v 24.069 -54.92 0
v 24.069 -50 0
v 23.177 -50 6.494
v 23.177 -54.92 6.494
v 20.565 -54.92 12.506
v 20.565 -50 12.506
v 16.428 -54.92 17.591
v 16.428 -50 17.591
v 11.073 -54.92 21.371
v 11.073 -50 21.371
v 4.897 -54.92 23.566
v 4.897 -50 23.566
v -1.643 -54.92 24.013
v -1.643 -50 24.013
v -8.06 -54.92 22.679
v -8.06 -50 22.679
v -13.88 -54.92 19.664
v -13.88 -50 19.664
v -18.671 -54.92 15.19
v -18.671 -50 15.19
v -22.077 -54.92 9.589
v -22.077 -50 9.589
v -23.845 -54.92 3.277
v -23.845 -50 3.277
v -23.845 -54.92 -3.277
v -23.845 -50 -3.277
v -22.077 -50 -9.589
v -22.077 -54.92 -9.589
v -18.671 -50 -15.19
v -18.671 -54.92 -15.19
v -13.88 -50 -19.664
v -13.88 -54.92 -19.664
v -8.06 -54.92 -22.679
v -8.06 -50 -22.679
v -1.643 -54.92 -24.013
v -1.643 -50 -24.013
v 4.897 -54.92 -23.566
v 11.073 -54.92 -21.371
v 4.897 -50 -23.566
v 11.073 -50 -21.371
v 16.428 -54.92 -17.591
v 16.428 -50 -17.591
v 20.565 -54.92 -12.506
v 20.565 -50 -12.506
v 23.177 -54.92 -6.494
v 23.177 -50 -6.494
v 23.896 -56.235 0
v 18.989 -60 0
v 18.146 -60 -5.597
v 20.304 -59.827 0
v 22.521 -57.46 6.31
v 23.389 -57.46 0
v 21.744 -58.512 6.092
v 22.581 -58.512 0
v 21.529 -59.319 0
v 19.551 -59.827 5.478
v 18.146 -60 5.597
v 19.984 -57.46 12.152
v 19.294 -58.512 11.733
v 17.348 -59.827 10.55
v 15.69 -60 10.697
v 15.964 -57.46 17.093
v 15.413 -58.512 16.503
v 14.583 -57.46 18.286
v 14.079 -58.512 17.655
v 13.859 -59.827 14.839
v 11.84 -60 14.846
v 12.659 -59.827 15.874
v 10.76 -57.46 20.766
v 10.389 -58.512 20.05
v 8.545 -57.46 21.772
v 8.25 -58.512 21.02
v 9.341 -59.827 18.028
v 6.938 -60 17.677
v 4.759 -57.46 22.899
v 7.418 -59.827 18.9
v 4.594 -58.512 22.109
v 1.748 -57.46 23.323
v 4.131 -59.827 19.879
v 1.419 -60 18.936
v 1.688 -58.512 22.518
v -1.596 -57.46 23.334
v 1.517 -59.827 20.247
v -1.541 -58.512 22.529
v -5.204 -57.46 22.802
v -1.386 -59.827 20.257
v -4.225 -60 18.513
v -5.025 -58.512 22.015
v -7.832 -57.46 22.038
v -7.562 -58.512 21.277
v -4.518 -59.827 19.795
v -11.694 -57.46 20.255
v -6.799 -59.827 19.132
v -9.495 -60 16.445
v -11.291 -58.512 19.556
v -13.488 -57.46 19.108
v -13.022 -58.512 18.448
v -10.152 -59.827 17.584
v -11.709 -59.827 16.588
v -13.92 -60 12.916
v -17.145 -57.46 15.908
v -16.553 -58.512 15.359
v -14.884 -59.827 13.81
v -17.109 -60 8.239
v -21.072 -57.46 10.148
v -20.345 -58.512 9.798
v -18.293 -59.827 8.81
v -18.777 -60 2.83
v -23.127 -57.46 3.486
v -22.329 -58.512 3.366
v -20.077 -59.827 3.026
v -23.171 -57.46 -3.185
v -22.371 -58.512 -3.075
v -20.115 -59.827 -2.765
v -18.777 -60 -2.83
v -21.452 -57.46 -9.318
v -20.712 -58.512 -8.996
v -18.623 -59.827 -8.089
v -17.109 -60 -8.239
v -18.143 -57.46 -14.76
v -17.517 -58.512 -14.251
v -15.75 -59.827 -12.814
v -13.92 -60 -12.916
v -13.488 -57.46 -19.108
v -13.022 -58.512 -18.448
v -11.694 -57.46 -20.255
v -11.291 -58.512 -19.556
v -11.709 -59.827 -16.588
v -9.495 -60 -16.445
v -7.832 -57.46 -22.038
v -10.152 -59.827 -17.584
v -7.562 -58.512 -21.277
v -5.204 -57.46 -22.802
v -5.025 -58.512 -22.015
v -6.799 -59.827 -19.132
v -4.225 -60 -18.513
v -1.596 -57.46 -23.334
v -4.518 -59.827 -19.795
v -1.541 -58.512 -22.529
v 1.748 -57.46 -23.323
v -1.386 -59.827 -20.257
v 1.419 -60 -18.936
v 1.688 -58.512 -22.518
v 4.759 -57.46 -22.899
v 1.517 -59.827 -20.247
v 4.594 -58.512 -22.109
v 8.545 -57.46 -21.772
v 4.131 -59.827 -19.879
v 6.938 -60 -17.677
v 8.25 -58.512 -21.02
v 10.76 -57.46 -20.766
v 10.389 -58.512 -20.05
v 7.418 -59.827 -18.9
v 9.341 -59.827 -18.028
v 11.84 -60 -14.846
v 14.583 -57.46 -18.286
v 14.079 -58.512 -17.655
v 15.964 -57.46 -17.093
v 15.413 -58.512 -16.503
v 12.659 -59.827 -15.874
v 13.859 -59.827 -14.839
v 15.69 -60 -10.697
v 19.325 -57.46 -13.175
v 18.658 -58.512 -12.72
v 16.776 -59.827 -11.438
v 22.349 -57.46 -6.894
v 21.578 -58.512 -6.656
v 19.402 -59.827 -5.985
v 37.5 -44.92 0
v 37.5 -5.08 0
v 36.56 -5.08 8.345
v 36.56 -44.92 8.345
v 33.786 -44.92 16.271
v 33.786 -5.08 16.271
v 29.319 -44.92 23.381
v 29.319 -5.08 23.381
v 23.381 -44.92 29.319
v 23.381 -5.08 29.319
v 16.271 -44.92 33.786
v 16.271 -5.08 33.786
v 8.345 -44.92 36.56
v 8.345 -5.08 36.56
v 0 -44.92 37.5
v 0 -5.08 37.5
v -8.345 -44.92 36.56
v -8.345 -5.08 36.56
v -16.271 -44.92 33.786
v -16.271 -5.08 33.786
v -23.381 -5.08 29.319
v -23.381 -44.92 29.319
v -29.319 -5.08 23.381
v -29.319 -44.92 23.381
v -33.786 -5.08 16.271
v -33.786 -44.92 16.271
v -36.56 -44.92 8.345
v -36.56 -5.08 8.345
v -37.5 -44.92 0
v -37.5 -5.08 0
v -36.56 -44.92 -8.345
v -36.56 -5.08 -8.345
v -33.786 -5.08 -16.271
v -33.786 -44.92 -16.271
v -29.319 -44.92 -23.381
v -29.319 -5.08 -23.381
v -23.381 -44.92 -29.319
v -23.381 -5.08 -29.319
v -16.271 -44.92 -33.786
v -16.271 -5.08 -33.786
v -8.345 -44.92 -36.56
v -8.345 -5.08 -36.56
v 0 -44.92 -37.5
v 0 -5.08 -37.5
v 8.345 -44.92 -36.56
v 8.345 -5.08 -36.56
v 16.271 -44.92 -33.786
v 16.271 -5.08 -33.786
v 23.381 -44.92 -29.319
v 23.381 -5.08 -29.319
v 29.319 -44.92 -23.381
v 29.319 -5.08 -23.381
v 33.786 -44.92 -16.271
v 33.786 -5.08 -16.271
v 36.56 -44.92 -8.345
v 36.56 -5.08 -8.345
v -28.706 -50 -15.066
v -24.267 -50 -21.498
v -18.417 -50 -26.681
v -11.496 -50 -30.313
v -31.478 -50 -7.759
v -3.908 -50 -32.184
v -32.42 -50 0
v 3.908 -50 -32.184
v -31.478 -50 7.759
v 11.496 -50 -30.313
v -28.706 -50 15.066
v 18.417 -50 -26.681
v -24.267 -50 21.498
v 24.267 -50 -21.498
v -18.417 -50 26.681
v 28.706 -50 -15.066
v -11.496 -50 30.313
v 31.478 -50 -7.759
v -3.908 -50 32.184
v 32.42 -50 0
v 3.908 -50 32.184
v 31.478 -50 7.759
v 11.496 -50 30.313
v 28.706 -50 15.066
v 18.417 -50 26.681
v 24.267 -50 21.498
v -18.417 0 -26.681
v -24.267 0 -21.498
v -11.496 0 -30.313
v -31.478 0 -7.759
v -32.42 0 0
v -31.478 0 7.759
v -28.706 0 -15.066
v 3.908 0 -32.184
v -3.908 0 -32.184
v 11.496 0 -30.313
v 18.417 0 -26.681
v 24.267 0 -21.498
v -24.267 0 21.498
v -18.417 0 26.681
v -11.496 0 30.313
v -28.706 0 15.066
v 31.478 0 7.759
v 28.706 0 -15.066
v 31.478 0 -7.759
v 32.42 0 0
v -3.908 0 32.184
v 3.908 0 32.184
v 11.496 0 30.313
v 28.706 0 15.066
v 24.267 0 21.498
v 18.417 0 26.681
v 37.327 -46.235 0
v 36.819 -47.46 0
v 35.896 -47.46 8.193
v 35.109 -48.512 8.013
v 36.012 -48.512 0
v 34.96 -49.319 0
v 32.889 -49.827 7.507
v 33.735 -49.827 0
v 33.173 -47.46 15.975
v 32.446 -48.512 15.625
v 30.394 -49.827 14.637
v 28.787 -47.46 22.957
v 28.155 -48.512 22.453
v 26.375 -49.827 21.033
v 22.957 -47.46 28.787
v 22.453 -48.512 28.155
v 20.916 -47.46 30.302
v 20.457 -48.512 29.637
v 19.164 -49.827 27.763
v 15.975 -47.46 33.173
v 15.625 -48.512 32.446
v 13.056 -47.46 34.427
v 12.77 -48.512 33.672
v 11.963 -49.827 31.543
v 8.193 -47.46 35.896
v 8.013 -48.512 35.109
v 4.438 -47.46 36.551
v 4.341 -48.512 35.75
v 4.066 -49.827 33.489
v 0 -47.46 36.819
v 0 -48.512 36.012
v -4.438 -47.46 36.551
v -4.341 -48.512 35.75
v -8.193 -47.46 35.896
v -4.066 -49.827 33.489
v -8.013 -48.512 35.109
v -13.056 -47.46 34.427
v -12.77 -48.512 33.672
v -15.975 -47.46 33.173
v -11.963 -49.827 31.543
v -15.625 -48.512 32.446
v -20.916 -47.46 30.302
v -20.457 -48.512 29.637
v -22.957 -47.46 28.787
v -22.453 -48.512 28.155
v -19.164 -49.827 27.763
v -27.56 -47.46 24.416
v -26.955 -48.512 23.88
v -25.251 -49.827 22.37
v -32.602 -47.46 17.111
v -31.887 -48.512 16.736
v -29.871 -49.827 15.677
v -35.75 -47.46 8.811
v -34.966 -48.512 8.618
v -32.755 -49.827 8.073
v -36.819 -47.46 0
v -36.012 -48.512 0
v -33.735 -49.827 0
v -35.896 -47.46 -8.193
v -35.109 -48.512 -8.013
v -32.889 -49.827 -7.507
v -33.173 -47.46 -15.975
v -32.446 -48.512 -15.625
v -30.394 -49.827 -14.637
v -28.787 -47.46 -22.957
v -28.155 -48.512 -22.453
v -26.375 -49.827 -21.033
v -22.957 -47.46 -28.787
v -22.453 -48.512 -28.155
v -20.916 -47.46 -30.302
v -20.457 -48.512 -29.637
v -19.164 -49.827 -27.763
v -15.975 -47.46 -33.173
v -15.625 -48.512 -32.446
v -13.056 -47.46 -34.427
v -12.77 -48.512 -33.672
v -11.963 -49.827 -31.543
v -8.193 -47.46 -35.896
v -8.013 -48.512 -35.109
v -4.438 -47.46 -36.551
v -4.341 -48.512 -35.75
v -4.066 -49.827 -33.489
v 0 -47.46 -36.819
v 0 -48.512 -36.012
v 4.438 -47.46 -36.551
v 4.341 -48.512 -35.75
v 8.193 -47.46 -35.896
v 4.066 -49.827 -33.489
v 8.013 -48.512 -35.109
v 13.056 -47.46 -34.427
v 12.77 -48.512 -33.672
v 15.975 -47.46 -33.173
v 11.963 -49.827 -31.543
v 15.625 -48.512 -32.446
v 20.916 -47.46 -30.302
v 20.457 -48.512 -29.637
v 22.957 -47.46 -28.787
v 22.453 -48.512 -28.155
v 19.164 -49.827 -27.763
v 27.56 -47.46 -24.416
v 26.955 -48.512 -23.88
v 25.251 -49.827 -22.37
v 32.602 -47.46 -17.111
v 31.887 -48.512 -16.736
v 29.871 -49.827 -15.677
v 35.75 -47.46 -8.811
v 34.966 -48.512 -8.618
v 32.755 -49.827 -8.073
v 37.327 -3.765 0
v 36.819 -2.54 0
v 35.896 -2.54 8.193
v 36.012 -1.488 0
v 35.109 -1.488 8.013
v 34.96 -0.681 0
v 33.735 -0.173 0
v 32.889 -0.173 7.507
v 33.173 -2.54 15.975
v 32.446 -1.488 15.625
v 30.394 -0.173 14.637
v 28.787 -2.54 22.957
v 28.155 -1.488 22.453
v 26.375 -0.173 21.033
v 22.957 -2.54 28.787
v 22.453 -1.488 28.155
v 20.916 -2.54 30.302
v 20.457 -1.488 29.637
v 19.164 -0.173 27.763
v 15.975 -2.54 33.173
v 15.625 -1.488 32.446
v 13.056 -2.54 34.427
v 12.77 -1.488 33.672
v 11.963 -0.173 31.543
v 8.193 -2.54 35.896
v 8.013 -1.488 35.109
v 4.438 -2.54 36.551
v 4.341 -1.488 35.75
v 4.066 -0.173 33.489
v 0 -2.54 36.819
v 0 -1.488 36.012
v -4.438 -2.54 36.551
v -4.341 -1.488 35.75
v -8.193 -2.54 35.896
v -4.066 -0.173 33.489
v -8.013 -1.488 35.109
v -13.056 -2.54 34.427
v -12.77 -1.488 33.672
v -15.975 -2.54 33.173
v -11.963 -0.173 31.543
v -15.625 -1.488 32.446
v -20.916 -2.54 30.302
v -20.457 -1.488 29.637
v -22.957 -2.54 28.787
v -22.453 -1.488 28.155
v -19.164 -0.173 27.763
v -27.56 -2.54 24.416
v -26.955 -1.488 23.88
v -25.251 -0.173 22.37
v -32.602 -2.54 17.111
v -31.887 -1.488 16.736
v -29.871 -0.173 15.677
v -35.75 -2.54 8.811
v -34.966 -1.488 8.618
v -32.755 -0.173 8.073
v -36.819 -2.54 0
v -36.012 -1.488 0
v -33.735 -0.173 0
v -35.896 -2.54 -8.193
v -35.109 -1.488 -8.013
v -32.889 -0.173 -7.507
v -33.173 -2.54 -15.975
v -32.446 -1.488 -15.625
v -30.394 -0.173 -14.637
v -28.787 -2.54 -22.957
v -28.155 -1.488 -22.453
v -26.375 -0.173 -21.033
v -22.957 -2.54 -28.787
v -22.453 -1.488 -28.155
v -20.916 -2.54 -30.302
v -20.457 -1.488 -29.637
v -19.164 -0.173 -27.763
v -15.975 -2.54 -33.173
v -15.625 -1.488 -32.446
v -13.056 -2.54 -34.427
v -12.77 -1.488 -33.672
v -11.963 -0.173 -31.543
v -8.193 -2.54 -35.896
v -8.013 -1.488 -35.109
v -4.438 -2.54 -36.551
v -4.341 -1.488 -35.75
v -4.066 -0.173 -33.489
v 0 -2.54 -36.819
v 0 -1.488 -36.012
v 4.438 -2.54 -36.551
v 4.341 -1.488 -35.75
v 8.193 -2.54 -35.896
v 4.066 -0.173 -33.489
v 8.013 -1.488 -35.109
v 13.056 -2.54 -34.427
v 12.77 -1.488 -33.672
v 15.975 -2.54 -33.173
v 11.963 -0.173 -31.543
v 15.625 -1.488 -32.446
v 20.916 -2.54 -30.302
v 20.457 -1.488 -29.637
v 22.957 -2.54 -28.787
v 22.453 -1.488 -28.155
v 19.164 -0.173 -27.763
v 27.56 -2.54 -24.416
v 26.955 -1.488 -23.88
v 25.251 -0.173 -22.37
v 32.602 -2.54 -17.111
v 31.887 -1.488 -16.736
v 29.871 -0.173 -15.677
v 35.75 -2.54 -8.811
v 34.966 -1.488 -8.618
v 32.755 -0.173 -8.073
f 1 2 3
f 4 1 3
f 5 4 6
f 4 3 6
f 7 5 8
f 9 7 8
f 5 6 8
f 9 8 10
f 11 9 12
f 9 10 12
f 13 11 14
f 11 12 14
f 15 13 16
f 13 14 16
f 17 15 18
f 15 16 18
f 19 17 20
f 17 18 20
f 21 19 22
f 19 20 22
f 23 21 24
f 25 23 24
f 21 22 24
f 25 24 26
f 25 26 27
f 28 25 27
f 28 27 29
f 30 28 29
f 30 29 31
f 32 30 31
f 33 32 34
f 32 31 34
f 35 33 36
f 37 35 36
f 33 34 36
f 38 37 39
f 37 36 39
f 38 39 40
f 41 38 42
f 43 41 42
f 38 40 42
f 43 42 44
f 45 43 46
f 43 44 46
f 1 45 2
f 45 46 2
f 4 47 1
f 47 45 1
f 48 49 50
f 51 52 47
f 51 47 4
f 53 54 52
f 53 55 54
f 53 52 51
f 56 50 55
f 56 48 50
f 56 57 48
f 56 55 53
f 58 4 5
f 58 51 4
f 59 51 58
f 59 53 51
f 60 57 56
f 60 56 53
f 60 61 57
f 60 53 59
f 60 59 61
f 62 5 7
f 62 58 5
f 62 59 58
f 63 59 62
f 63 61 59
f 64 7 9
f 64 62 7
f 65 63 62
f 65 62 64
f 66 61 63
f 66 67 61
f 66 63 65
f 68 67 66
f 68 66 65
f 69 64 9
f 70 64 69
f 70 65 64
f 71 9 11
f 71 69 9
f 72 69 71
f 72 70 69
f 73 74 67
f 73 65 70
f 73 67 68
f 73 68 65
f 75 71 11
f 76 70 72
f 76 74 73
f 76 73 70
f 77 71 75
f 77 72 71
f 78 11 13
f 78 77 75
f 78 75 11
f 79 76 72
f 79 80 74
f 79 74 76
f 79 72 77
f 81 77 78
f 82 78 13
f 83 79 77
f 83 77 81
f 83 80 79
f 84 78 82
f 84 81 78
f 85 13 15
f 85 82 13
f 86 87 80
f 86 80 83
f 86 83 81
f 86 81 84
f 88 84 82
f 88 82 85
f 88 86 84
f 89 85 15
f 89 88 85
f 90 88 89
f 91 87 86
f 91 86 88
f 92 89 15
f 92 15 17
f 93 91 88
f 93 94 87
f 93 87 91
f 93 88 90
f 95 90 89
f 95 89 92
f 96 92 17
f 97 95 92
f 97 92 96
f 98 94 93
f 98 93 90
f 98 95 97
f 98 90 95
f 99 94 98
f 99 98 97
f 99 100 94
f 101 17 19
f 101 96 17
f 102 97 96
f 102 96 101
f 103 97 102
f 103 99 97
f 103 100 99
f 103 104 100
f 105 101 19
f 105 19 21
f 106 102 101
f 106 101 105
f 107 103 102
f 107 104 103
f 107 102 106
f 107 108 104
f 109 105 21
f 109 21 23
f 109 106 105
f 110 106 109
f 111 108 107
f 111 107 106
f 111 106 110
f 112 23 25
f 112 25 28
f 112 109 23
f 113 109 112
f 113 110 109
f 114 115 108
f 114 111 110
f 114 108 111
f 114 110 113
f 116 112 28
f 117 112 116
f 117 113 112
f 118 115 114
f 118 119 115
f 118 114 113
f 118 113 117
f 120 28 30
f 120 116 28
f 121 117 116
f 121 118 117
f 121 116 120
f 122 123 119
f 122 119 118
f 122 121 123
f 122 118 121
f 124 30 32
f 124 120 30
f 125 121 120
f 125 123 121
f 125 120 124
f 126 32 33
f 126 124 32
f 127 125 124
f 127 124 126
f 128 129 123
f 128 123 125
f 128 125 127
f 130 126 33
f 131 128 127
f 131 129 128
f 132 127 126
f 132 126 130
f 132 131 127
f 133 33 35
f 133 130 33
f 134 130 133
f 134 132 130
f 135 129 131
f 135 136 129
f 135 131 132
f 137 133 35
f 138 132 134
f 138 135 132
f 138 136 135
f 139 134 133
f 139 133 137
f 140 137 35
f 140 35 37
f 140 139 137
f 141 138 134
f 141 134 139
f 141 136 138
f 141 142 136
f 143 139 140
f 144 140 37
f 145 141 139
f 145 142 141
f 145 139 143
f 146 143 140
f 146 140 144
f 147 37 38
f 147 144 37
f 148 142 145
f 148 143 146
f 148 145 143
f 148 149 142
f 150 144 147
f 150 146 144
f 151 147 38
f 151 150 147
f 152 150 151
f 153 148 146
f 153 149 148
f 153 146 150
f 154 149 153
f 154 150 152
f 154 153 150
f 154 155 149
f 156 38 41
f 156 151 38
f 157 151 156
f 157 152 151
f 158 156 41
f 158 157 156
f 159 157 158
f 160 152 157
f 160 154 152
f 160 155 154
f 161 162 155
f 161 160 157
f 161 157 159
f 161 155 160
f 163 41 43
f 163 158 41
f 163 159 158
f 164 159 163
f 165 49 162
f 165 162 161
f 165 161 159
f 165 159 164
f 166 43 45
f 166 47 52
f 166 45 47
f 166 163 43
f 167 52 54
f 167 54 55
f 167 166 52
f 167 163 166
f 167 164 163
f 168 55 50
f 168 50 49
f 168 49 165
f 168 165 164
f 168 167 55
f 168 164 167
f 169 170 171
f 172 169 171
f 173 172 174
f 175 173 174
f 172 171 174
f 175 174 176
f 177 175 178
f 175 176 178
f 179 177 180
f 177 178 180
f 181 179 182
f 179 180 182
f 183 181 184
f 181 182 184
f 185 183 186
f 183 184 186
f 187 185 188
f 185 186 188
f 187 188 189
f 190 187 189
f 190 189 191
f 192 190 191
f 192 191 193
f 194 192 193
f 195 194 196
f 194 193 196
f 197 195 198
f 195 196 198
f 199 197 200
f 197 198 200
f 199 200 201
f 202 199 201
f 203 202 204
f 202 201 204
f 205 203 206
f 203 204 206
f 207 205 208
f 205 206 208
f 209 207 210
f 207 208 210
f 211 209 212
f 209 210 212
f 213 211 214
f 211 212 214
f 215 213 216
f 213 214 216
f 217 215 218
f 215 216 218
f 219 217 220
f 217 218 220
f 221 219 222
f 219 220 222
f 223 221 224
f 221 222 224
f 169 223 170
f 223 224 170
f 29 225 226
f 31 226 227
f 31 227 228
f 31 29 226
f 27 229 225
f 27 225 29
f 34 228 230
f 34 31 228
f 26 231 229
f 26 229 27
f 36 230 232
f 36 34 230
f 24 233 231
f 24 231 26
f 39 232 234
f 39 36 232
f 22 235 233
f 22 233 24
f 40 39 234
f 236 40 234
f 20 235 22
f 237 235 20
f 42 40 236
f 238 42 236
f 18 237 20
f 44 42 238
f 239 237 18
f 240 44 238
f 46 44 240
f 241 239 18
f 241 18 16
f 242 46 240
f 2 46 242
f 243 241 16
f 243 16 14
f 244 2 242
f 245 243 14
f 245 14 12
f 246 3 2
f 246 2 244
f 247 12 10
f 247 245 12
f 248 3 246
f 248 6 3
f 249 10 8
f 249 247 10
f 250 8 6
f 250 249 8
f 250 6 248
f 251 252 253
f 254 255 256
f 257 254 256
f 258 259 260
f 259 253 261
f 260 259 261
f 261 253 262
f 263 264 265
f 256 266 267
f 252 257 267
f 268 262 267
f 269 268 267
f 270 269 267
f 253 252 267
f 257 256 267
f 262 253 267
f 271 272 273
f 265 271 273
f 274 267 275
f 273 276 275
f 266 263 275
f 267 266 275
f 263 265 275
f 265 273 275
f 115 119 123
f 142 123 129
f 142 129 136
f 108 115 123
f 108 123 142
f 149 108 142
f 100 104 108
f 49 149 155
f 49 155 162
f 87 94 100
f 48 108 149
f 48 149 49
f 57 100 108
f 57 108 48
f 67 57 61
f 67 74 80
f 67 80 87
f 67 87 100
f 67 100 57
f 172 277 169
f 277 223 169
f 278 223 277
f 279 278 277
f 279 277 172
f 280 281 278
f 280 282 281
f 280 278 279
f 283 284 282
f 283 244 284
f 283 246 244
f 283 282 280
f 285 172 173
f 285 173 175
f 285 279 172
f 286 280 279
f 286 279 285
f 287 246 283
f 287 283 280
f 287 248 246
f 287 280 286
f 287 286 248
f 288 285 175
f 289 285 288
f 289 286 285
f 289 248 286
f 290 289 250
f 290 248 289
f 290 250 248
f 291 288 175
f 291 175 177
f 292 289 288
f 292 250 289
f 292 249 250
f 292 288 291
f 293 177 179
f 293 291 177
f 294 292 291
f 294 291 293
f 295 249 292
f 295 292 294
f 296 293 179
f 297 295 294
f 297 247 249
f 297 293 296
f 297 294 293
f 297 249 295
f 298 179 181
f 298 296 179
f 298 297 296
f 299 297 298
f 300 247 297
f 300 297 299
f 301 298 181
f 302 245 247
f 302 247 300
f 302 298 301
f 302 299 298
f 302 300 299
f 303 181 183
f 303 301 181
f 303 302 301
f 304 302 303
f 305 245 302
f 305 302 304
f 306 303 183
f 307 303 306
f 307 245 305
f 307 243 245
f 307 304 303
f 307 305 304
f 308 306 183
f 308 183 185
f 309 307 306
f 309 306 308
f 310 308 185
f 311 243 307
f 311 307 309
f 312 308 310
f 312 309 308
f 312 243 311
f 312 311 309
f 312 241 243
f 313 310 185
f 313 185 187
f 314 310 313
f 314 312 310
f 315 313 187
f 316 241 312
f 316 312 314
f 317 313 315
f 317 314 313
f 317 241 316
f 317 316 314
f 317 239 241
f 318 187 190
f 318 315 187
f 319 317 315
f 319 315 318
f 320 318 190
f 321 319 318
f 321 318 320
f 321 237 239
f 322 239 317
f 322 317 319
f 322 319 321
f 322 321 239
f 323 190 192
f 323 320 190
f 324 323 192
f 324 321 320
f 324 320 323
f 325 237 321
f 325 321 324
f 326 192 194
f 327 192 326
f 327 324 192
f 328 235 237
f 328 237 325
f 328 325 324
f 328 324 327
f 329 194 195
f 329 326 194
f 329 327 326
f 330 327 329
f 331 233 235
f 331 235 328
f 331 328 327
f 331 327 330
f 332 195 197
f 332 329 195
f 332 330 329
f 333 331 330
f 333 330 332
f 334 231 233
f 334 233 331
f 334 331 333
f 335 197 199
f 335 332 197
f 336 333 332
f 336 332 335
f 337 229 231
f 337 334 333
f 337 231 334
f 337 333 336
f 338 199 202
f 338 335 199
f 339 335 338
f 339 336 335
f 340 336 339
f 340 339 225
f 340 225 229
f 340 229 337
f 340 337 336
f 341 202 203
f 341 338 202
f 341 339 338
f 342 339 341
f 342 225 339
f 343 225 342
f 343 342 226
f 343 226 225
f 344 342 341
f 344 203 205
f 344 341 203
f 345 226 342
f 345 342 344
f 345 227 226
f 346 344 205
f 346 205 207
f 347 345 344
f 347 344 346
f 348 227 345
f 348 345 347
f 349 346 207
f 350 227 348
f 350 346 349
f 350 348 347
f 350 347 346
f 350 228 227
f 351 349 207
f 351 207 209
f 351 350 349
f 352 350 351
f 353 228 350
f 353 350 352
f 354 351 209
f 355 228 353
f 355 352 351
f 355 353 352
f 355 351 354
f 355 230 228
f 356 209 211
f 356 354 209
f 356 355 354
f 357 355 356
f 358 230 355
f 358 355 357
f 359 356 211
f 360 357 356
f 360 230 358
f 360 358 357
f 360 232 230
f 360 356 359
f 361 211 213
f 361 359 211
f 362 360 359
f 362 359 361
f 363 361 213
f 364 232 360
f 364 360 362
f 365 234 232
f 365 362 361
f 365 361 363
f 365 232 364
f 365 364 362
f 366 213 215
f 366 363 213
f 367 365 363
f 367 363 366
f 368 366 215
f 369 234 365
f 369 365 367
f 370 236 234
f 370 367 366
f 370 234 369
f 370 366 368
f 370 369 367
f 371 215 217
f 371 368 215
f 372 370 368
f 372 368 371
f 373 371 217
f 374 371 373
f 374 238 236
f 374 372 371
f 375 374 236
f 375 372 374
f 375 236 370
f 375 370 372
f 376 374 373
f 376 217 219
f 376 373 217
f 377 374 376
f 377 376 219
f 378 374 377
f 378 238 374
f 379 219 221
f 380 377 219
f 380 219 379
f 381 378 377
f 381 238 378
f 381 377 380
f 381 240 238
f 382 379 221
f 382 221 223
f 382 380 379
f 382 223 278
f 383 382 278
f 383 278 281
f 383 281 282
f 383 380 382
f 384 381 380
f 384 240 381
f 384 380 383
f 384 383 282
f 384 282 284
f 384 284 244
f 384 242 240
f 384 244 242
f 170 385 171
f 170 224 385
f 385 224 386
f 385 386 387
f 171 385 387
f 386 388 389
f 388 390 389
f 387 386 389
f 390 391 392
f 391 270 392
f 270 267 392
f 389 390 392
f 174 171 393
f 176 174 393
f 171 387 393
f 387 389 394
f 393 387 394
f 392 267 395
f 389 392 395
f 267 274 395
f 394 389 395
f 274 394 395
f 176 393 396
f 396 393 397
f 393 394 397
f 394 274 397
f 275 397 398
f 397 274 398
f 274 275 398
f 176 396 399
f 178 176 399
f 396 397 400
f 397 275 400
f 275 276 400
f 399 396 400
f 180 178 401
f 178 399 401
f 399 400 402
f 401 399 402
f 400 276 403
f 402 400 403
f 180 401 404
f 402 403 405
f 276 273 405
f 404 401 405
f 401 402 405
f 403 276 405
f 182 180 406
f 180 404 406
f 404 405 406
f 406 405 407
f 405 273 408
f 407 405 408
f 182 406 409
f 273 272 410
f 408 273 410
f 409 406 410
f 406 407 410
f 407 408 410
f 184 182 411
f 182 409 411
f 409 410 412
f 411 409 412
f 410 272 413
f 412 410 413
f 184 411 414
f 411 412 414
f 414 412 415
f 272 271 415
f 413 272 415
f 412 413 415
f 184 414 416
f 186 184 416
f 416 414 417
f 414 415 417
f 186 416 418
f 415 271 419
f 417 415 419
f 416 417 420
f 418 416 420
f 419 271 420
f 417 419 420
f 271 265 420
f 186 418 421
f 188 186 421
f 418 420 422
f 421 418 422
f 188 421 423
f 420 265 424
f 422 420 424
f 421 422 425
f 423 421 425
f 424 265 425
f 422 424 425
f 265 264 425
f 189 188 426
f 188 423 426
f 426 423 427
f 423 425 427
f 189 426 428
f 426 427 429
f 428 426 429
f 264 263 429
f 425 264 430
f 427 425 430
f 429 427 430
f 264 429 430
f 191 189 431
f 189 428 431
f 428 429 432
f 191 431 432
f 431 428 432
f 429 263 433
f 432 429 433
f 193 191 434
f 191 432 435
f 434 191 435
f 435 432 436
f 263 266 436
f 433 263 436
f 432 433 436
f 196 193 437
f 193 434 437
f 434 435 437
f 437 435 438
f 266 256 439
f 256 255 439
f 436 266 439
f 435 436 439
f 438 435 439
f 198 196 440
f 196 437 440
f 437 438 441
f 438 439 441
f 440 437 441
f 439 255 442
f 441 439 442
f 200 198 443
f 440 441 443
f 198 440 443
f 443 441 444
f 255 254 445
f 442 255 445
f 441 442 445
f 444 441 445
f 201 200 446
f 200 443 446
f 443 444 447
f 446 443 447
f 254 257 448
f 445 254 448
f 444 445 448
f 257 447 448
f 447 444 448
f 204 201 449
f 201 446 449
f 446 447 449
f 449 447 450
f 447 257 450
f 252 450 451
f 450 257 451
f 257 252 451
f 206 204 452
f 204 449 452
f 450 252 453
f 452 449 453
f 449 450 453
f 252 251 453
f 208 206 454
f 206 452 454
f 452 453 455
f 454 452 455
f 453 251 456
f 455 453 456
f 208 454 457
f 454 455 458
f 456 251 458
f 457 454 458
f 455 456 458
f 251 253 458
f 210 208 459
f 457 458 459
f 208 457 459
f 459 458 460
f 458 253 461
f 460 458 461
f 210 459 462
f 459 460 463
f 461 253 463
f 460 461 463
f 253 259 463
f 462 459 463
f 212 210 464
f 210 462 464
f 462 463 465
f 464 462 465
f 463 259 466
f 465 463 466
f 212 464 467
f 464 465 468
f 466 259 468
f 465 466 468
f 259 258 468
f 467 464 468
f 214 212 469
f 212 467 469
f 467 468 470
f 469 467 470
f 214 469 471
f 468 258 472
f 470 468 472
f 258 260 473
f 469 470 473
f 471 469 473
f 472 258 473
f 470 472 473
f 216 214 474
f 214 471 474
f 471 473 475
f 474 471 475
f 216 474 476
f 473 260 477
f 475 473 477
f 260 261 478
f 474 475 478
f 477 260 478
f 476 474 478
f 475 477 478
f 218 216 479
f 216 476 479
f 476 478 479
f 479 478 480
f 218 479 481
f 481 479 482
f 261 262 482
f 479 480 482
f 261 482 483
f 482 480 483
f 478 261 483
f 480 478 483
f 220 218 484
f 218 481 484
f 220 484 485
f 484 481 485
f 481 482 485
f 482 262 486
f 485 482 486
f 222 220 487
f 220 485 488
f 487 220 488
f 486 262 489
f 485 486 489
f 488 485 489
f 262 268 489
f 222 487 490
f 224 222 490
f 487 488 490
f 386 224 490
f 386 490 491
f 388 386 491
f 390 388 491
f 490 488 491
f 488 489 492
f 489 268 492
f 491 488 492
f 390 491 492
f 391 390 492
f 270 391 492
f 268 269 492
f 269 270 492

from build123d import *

# Parameters (mm, degrees)
F0_R     = 37.5
F1_DEPTH = 50
F2_R     = 24.069175
F3_DEPTH = 10
F4_R     = 5.08
F5_R     = 5.08


with BuildPart() as f1:
    # F0 (on Front) → F1 (new body)
    with BuildSketch(Plane.XZ):
        Circle(F0_R)
    extrude(amount=F1_DEPTH)

    # F2 (on face) → F3 (join)
    with BuildSketch(Plane.XZ.offset(50)):
        Circle(F2_R)
    extrude(amount=F3_DEPTH)

    # F4
    f4_edges = [f1.edges().sort_by_distance(p)[0] for p in [
        (37.5, -25, 0),
        (-37.5, 0, 0),
        (-37.5, -50, 0),
    ]]
    fillet(f4_edges, radius=F4_R)

    # F5
    f5_edges = [f1.edges().sort_by_distance(p)[0] for p in [
        (-24.069175, -60, 0),
    ]]
    fillet(f5_edges, radius=F5_R)


solid = f1.part
